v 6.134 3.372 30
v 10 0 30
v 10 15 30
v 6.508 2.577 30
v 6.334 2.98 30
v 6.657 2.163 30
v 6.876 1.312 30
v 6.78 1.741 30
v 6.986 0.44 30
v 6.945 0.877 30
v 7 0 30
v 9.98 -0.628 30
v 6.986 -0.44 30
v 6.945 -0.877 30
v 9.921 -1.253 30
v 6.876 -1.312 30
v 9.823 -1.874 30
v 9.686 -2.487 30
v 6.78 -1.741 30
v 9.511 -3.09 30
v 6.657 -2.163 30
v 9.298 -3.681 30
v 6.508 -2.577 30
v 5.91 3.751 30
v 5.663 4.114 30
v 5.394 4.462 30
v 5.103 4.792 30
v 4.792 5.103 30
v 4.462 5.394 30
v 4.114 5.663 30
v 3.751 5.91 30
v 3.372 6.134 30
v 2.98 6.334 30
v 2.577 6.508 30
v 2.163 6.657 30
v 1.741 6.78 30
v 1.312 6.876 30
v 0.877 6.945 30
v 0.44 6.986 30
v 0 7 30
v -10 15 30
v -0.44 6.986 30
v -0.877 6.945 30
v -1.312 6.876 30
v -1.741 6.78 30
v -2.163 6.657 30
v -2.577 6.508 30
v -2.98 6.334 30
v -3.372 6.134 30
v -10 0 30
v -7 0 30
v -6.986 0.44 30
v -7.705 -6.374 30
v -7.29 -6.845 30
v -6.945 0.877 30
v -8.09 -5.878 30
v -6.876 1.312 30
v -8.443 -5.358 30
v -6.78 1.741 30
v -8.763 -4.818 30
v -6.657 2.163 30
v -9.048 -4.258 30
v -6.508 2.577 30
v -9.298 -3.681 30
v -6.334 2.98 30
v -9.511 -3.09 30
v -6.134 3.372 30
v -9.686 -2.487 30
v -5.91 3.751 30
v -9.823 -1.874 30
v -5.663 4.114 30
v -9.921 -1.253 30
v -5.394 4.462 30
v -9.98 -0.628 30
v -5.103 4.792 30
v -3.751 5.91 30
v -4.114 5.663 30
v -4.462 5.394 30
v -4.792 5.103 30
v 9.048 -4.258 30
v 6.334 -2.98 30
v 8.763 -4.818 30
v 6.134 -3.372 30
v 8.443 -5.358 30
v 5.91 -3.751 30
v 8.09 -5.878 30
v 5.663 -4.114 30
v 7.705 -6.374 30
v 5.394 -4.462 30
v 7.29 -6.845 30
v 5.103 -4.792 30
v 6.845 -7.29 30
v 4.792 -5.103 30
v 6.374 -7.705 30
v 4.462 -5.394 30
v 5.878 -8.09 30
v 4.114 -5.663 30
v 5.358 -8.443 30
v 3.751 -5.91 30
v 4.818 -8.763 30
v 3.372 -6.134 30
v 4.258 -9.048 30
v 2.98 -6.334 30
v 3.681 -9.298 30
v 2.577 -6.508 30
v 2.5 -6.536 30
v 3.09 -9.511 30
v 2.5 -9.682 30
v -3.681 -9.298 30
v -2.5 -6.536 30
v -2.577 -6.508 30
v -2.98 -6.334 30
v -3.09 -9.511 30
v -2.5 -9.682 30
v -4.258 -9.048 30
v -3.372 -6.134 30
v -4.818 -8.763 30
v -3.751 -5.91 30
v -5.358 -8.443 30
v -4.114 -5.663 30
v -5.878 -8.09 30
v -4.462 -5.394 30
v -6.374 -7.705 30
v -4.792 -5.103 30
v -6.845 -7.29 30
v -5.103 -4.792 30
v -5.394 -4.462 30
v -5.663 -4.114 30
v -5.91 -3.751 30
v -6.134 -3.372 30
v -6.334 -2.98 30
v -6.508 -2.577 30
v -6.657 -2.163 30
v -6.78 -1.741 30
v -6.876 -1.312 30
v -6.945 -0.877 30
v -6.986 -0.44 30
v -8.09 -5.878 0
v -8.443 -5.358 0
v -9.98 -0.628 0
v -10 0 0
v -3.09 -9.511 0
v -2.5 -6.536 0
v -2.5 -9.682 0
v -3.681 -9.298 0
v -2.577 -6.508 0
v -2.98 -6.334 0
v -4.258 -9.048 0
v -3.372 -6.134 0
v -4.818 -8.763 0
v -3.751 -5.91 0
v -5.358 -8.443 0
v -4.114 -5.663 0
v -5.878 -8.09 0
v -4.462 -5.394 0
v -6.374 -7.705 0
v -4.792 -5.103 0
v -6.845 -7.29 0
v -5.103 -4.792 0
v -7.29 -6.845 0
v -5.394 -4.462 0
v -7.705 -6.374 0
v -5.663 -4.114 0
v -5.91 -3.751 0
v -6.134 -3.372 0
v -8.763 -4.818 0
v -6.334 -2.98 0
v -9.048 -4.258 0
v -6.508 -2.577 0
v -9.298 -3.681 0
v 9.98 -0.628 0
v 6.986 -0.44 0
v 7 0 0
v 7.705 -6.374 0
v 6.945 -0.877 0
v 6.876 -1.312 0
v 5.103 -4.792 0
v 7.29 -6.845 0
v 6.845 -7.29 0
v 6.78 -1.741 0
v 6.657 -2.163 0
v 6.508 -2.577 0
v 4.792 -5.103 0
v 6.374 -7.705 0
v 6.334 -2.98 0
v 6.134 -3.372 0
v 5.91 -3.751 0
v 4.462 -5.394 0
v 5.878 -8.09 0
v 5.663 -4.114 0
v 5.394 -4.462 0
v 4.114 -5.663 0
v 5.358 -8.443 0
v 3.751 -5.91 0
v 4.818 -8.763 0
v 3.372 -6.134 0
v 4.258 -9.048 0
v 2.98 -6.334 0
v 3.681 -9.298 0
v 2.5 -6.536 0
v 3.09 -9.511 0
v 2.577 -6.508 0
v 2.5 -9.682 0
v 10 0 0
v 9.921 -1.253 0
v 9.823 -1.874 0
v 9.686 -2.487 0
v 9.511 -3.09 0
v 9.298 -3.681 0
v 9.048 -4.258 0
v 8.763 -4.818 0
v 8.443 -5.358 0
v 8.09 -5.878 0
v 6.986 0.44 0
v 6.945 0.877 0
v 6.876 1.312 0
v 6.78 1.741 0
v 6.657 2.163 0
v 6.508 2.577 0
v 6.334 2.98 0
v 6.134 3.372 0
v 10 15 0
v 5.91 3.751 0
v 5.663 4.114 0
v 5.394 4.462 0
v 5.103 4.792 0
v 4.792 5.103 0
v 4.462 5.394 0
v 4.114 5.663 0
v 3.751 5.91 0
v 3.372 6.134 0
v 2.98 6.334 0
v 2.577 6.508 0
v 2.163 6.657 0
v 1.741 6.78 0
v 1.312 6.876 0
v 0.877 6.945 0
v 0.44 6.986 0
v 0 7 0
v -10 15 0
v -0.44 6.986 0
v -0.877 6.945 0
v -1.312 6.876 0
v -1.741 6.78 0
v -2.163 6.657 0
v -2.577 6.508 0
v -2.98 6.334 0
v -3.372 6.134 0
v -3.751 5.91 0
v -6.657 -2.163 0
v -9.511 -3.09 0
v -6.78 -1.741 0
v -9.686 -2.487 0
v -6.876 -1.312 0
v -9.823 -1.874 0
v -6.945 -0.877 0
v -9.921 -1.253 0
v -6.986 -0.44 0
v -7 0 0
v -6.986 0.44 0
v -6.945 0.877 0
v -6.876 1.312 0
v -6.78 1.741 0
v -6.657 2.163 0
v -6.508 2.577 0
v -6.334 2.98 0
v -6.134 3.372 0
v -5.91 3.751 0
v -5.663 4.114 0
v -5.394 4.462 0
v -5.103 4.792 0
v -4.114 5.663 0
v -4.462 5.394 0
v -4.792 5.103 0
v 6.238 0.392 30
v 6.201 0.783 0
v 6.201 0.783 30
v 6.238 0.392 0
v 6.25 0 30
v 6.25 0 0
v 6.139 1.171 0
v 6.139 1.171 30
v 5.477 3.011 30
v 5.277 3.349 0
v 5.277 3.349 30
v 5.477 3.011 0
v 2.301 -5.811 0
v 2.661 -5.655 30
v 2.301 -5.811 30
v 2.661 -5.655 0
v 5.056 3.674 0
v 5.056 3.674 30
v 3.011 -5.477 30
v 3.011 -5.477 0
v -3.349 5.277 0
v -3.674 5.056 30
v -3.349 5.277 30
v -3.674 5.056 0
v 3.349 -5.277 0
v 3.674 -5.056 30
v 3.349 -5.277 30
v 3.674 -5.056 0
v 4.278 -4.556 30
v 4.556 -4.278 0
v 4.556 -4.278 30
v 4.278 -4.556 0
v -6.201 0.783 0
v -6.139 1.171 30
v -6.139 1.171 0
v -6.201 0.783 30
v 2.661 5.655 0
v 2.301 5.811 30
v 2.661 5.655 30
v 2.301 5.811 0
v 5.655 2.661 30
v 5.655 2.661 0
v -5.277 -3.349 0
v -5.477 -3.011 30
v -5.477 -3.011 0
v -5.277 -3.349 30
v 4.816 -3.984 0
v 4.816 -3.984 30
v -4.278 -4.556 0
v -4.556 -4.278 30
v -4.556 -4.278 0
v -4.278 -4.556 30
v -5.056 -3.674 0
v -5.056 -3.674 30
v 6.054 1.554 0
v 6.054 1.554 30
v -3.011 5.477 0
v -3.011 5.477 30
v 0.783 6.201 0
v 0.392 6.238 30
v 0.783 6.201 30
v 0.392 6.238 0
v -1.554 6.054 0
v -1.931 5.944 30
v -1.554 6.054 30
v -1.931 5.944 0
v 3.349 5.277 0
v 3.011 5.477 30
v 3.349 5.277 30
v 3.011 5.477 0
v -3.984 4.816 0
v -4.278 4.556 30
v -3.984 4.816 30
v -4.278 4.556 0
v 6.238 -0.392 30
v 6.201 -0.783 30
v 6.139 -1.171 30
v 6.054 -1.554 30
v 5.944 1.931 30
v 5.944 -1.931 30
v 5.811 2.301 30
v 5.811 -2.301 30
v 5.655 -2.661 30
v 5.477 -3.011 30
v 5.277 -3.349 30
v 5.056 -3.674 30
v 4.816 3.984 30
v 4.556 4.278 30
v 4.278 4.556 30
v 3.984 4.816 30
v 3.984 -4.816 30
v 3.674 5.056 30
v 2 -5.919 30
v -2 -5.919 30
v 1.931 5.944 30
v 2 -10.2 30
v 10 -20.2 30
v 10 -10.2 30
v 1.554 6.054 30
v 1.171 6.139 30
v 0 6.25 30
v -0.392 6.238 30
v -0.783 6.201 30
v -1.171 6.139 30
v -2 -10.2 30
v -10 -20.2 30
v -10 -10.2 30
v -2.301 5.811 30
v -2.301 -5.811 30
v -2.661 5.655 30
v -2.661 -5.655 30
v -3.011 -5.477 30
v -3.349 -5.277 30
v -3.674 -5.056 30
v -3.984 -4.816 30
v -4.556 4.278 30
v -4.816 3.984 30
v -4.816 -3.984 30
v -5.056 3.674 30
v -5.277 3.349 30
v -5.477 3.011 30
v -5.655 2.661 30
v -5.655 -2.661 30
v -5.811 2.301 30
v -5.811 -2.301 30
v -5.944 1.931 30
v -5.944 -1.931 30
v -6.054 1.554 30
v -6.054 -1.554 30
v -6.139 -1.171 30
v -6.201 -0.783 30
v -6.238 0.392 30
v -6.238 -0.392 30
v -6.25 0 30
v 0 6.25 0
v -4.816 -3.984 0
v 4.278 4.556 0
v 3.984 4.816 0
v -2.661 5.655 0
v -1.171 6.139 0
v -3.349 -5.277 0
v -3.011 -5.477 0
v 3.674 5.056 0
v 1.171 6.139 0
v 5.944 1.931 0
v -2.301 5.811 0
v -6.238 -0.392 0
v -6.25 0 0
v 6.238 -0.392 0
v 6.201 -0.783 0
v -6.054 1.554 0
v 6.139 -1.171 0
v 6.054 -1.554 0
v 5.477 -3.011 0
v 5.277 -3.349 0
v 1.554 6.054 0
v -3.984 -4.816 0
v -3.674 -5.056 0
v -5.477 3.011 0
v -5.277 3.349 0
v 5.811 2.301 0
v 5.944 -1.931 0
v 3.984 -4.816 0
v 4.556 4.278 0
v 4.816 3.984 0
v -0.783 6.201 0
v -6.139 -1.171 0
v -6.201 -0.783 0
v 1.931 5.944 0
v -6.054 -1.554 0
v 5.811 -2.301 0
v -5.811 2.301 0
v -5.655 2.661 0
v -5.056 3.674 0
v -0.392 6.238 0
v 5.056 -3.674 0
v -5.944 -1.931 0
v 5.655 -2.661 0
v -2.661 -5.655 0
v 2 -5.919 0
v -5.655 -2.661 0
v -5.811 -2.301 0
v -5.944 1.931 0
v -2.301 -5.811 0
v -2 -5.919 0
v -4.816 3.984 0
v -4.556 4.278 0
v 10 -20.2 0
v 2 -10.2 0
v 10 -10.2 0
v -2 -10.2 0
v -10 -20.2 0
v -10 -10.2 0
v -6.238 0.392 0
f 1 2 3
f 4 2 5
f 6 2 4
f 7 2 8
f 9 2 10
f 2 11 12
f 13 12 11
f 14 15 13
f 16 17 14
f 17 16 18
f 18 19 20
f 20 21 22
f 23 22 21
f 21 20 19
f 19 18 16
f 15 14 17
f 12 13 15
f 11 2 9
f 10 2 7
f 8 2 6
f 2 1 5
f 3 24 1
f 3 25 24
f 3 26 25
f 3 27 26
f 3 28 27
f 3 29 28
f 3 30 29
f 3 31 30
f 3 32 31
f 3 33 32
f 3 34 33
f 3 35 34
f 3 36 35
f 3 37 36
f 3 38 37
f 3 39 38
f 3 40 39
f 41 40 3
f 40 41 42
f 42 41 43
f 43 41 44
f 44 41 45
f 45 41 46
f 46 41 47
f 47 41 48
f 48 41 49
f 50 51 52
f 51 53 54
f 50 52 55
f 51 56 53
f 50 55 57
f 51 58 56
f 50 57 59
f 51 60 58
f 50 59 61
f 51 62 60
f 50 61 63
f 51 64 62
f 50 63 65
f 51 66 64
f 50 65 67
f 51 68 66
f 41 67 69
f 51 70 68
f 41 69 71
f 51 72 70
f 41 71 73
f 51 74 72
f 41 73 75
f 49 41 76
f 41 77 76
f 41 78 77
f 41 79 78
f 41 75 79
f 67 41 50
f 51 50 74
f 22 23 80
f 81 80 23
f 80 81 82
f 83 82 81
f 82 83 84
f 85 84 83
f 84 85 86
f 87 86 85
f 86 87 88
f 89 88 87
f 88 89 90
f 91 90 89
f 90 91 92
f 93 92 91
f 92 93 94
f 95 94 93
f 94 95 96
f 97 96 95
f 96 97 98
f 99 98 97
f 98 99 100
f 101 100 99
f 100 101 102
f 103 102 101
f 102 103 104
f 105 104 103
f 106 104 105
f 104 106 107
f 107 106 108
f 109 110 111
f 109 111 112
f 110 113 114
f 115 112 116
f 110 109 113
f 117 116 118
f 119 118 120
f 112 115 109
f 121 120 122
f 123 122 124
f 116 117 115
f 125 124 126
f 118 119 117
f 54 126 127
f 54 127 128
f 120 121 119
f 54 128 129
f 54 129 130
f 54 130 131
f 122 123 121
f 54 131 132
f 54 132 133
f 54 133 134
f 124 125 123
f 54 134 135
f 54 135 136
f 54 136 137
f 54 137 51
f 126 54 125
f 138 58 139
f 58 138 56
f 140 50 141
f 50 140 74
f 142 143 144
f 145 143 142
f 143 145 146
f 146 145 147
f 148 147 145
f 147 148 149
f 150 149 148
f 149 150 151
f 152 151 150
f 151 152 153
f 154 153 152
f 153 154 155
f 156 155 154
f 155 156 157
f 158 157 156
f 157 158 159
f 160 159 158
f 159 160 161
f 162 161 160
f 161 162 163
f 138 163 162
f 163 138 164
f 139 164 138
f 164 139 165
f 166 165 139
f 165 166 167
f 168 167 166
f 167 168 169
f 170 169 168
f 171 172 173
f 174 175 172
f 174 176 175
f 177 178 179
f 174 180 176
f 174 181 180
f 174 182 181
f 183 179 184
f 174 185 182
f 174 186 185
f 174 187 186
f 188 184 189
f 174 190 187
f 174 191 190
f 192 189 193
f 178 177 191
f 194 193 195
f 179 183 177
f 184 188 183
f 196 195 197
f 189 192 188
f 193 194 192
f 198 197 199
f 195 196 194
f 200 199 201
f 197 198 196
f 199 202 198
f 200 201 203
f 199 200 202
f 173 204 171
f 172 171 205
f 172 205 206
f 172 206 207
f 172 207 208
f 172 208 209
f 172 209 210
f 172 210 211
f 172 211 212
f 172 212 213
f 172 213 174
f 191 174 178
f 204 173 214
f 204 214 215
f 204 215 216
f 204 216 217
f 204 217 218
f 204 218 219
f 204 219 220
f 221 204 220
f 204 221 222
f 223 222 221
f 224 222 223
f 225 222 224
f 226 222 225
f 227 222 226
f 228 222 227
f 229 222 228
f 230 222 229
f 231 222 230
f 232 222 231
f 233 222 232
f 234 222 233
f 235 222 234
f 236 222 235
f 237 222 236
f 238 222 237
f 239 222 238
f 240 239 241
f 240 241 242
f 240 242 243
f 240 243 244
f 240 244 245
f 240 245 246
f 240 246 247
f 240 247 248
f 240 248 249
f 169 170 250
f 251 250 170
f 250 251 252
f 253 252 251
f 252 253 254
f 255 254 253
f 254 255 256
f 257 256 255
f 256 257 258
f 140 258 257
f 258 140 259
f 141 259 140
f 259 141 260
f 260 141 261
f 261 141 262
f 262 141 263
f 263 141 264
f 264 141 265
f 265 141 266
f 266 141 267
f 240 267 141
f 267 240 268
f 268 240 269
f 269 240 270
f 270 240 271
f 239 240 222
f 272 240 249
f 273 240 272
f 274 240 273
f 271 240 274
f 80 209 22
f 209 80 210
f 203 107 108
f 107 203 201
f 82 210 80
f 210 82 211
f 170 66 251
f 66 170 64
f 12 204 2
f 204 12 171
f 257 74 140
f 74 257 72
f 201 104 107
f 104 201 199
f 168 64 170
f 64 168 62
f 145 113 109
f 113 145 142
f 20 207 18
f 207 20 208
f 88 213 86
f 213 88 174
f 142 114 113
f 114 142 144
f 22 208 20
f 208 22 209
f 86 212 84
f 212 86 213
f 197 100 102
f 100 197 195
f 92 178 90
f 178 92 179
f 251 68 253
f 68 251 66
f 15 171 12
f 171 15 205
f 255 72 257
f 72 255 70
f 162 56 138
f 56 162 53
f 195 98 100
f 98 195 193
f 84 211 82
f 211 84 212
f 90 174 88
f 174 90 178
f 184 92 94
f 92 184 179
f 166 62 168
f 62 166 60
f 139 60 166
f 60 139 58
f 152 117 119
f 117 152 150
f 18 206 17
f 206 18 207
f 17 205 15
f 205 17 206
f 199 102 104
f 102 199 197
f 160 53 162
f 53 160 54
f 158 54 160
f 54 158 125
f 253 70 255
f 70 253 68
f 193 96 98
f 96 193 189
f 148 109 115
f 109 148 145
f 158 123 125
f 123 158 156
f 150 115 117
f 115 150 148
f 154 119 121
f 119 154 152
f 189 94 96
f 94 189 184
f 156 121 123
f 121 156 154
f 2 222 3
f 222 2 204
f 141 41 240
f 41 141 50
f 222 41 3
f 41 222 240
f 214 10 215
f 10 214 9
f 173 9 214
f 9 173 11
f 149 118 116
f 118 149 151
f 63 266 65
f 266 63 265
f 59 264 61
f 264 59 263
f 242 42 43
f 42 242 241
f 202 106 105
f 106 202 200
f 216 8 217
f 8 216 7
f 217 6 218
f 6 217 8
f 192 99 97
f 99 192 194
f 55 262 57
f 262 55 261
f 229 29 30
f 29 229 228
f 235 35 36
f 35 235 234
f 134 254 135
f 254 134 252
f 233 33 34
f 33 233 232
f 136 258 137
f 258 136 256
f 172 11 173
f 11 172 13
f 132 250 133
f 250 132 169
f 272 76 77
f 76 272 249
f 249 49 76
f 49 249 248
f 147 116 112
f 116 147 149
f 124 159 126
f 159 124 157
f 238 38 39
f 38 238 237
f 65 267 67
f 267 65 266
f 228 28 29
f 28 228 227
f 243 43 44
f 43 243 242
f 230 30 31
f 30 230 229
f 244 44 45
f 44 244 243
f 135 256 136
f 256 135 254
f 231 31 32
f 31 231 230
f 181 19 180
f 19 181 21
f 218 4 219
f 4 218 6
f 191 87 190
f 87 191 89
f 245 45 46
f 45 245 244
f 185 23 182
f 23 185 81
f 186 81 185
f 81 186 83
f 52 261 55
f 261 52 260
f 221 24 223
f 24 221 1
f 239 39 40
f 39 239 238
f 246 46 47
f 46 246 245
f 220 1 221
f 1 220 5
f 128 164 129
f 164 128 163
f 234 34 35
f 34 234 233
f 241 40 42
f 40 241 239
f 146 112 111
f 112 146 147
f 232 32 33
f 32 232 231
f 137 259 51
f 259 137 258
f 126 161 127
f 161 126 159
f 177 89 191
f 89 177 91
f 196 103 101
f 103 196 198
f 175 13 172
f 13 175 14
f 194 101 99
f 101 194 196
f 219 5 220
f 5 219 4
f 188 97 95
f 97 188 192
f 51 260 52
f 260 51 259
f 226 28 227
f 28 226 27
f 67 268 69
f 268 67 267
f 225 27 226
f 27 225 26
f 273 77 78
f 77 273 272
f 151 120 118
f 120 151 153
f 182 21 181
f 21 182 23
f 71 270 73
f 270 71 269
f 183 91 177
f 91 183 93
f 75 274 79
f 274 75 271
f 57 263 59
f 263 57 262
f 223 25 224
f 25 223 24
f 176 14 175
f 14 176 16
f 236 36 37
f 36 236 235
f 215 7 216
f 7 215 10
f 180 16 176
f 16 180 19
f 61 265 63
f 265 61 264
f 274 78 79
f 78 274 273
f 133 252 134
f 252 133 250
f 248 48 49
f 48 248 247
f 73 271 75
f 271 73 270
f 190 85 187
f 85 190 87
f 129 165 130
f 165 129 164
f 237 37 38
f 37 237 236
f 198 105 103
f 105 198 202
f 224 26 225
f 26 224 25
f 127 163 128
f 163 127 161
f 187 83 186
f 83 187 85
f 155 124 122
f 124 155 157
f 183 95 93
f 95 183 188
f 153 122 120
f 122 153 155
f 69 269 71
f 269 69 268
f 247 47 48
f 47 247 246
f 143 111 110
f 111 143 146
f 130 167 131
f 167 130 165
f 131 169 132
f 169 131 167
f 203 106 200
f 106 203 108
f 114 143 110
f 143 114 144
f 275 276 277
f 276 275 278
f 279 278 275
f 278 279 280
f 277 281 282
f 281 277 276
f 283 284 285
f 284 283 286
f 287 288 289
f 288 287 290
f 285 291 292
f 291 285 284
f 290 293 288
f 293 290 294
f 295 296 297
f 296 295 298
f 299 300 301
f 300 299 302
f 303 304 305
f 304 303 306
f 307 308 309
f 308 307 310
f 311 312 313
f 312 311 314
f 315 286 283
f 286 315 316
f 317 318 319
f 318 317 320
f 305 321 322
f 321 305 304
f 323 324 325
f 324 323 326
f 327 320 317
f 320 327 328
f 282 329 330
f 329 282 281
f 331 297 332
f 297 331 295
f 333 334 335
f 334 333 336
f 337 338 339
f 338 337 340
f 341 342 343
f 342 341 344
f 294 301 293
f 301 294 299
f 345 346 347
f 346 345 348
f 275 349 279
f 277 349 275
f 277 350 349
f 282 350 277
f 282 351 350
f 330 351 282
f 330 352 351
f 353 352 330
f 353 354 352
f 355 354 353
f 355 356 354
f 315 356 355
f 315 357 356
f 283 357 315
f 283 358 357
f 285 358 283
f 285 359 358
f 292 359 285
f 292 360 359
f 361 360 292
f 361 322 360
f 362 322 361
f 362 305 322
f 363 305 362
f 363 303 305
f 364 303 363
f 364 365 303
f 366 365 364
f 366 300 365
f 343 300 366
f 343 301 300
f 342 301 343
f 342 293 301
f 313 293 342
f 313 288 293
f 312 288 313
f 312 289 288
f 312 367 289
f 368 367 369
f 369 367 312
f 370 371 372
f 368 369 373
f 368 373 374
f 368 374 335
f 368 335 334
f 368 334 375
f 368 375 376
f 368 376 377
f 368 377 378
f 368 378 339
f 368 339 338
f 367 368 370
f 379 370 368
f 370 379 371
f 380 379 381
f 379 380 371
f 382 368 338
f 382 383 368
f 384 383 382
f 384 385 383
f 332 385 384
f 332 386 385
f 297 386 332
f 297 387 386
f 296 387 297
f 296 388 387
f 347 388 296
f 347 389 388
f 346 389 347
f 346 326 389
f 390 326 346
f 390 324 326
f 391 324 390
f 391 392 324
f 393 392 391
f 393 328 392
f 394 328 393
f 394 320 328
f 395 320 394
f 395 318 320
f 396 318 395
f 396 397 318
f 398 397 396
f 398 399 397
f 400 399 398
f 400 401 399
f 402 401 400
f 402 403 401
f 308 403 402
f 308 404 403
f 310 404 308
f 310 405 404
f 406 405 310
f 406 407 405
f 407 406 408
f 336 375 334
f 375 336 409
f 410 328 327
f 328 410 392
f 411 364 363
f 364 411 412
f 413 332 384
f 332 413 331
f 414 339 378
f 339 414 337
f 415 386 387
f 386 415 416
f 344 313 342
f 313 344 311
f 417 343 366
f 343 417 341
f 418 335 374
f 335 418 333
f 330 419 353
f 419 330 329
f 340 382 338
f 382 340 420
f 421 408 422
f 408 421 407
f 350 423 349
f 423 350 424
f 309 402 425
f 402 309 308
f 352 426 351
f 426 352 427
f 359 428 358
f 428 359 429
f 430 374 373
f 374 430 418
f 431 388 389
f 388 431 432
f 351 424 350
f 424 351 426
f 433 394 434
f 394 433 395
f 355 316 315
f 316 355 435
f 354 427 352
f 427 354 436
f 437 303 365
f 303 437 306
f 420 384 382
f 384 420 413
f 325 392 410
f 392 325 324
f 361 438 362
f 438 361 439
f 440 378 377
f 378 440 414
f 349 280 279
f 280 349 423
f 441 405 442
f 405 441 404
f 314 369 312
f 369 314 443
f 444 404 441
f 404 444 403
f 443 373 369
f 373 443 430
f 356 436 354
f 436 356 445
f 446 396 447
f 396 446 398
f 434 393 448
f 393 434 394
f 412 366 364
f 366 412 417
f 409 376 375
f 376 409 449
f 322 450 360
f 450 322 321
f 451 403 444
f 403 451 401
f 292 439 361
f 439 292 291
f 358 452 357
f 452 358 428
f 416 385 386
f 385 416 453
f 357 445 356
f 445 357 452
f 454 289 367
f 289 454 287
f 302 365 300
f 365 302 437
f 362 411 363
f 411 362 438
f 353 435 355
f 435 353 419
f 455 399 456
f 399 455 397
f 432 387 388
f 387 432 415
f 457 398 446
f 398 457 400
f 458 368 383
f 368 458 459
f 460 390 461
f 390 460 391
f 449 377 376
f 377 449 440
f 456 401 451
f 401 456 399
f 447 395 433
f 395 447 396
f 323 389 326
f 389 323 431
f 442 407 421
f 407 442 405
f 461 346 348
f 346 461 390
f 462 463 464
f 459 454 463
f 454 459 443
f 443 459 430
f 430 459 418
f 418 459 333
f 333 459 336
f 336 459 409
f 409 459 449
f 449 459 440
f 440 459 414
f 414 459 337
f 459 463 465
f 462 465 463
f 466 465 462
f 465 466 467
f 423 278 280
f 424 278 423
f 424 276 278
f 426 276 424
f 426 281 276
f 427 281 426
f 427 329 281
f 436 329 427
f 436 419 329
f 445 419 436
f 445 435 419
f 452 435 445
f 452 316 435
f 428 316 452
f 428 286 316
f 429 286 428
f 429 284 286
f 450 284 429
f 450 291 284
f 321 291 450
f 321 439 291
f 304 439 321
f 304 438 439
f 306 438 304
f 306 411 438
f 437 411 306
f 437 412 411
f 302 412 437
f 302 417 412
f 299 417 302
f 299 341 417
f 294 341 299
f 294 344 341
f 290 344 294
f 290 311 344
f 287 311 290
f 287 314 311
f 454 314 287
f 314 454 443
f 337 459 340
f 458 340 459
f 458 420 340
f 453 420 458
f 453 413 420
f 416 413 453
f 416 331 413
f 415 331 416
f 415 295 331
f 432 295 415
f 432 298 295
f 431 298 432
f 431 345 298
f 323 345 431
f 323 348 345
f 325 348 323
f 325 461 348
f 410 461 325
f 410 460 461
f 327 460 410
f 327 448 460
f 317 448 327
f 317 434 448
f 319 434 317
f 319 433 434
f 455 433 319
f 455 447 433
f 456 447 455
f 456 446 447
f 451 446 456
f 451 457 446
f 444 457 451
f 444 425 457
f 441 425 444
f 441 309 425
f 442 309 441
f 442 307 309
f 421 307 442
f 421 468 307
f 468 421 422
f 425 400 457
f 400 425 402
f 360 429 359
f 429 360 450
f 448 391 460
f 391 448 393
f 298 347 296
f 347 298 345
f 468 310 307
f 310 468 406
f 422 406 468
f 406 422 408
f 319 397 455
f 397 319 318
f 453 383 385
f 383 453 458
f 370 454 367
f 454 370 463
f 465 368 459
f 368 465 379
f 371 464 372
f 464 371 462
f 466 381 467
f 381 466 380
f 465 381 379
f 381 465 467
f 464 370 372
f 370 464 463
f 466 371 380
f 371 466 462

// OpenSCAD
// file: myTools.scad
module tube (r = 0, d = 0, l = 0, 
            thick = 0, 
            bCentered = true, 
            taper_pct = 0, 
            circlip = false) // r=radius d=dia l=length 
{
    assert( r != 0 || d != 0, "specify one of radius or diameter");
    assert( l != 0 , "tube: need length 'l' to be non zero");
    assert( thick != 0, "wall thickness cannot be zero");

    punch = $preview ? .2 : 0; // stop funny view artifact

    dia = r ? r * 2 : d;

    od = ((thick > 0) ? dia + thick * 2 : dia);
    id = (thick > 0) ? dia             : dia  + thick *2; 

    
    
    if (thick > 0)
        echo ("tube\tMIN id = ", id, "od = ", od, "wall = ", thick, "center= ", bCentered);
    else
        echo ("tube\tMAX od = ", od, "id = ", id, "wall = ", thick, "center= ", bCentered);

    echo ("tube\tHeigth = ", l);
        
    if (taper_pct != 0)
    {
        echo ("tube\t*** OD expanded by ", taper_pct, "%, : bottom od = ", od * (1. +taper_pct/100), "top od = ", od);
    }
    
    assert(dia || dia < 0, "tube : missing r or d ");
    
    // if taper_pct specified, the base will always be closest to 0,0,0
    translate([ 0, 0, taper_pct == 0 ? 0: bCentered ? l/2:l  ])
    rotate([0, taper_pct == 0 ? 0 : 180, 0 ])

    difference()
    {
        // make a reese's cup
        {
            color("YELLOW", .3)
            linear_extrude(height= l, scale = 1 + taper_pct/100)
                difference()
                {
                    circle(d = od);
                    circle(d = .5);
                }
        }
    
     // hollow out reessed cup
     color("GREEN")
     translate([0, 0, -punch/2])
     linear_extrude(height= l+ punch*2, $fn=100)
     {
        circle(d = id);
        if (circlip) #square([1 + punch, od ]);
     }
    
    }
}
//==============================================================================
        
module abox (dims, 
            thick = 0, 
            bCentered = true, 
            round_out = 0, 
            round_in = 0, 
            bSolid = false,
            bHollow = false,
            elevator = 0)   // move bottom up by X
{
    punch = $preview ? .1 : 0; // stop funny view artifact
    
    assert(thick != 0, "Thick must be specified. +=outside dim, -= inside dims");
    assert(dims.z > thick, "wall thickness too large for depth of box");

    wall2 = abs(thick) * 2; // 2 walls in each direction
    wall = wall2 / 2;
    
    // box either grows inward (thick < 0) or outward (thick > 0)  from dims
    fat = dims + [ wall2, wall2, wall];
    thin = dims - [ wall2, wall2, wall];
    
    offset = (thick > 0 && bCentered == false) ? wall : 0;
    
    //echo ("abox : adjusting x,y,z by ", offset, " to move origin from  center to 0,0,0");
    translate( [ bCentered ? 0 : dims.x /2 + offset, bCentered ? 0 : dims.y /2 + offset, bCentered ? 0 : dims.z /2 + offset/2]) 
    {
        if (thick > 0)
        {   
            // wall grows outwards from users dim
            echo ("making a box, MAX INSIDE dim = ", dims);
            echo ("   wall=", thick, " mm");
            echo ("   calc outside = ", fat, " mm");
        }
        else
        {
            // wall grows inward from users dime
            echo ("making a box, MAX OUTSIDE dim = ", dims);
            echo ("    wall=", thick, "mm");
            echo ("    calc inside = ", thin, " mm");
        }
        echo (" ");
        
        // linear extrude alway works in the positive x/y plane an goes upward.
        // after calc, re-center about 0,0,0 where a bCentered cube would be
        
        translate([ 0, 0, thick > 0  ? -fat.z/2 : -dims.z/2 ])
        difference()
        {
            echo ("round_out = ", round_out);

            // MAKE SOLID BOX --------------------------------------
            router_outside = round_out ? round_out : 0;
            x = thick > 0  ? fat.x - router_outside : dims.x - router_outside;
            y = thick > 0  ? fat.y - router_outside : dims.y - router_outside;


            // MAKE PUCHNED INSIDE
            // using 'offset' it will add r on all dimensions, then round., 
            // so now you have fatter perimeter than you started with :(
            //  but at least the corners are round.
            
            // Compensate by shrinking dimension by r, 
            // and then by calling offset, offset will then add it back

            //color("YELLOW", .2)

            // ready height 
            linear_extrude(thick > 0  ? fat.z : dims.z)
            if (round_out)
            {
                offset( r= round_out, $fn=30)
                square( [x - router_outside, y - router_outside], true);
            }
            else
            {
                // no rounding on outside dims.
                square( [x, y], true);
            }
            // time to punch out the inside if requested.
            if (bSolid == false)
            {
                hollow_offset = bHollow ? fat.z/2 + .2  : dims.z/2 +.2;
                // punching out inside. its either dims or thin.
                router_inside = round_in;
                echo ("round_in = ", router_inside);
                xi = thick > 0  ? dims.x  : thin.x;
                yi = thick > 0  ? dims.y : thin.y ;

                color("GREEN")

                // move 'punch' up if you need a bottom else zero (hollowed out)

                translate([ 0,0, bHollow ? -.1 : wall + elevator]) 
                linear_extrude(thick > 0  ? fat.z - wall  + hollow_offset : dims.z - wall + hollow_offset)
                //#linear_extrude(fat.z - wall  + hollow_offset)
                
                if (round_in) 
                {
                    offset( r= round_in, $fn=30)
                    square( [ xi - round_in*2, yi - round_in*2], true);
                }
                else
                    square( [ xi, yi], true);
            }
        }
    }
 }
//-----------------------------------------------------
module abox_punch (dims, 
            thick = 0, 
            bCentered = true, 
            round_out = 0, 
            round_in = 0, 
            bSolid = false,
            bHollow = false,
            elevator = 0)   // move bottom up by X
{
    // move bottom down by wall thickness to blow out bottom
    abox(dims, thick, bCentered,
         round_out, round_in, bSolid = false, 
         bHollow=true, elevator = -thick);
}



// 50x25x10 box walls grow inward (-2). on center origin midpoint
// rounded outside (default), sharp corner inside(default), bCentered about 0,0,0
//color("GREEN", .9)
//abox([50,25, 10], -2, true); 


// 50x25x10 box walls grow outward (+2). on center origin midpoint
// sharp outside corners, rounded inside corners. Sit on x,y plane
color("BLUE", .9)
abox([50,20, 10], +2, round_in=2, bCentered = false);  // 50x25x10 box inside dim origin has 0,0


// 50x25x10 box walls grow inward (-2). on center origin midpoint
// sharp corners inside and out. sits on x,y plane
color("GREY", .9)//
translate([ 55, 0, 0])      
abox([50,20, 10], +2, round_out=3, false);

color("PINK", .9)//
translate([ 55 * 2, 0, 0])      
abox_punch([50,20, 10], +2, round_out=3, false);

color("GREEN", .9)//
translate([ 55 * 3, 0, 0])      
abox_punch([50,20, 10], +2, round_in=2, false);


color("CYAN", .9)//
translate([ 55 * 4, 0, 0])      
abox_punch([50,20, 10], +2, round_in=2, round_out=2, false);


/*
color("GREEN", .9)//
translate([ 140, 10, -10])      
abox([86.66, 56.865, 5], 3, bHollow = true, bCentered = false); 
*/

/*
// 50x25x10 box walls grow inward (-2). on center origin midpoint
// round corners outside and SOLID
color("BLUE", .9)//
translate([ 55, 0, 0])      
abox([50,25, 10], +2, round_out=2, round_in=0, false, bSolid = true); // 50x25x10 box outside dim origin is 0,0
*/

//translate ([-30,-30, 0])
{
/*
    // tube outer dia  20, inner dia = (20 - 8)
    color("PINK")
    tube (d = 20, l = 20, thick = -8, bCentered = false);

    // tube, inner dia = (2* 10), outer dia = ((2*10) + 2) 
    color("PURPLE", .3)
    tube (r = 10, l = 20, thick = +2, bCentered= true);
*/
/*
    tube (d = 60, l = 20, thick = -6, bCentered = false);

    translate([0, 0, 50])
    tube (d = 60, l = 20, thick = -6, bCentered = false, taper_pct = 20, circlip = true);
    //color("GREEN")
    //tube (d = 20, l = 20, thick = -2, bCentered = false, taper = 10, circlip = true);
*/

}
// main file
use <myTools.scad>
$fn=100;

THICK=3;
DIA=20;
HEIGHT= 30;

DEMO=1;

UP= DEMO ? 0 : 5;


module top()
{
    difference()
    {
        union()
        {
            cylinder (d=DIA, h = HEIGHT);
            translate([-DIA/2, 0, 0])
            cube([DIA, DIA * 3/4, HEIGHT]);
        }
        
        translate([ 0, 0, UP -.1 ])
        cylinder (d=DIA-THICK*2, h= HEIGHT+.2);

        translate([ -DIA/8, -DIA, UP -.1 ])
        cube([DIA/4, DIA, HEIGHT+.1]);
        
    }
}   

module bottom()
{
    //difference()
    {
        //union()
        //{
        //    cylinder (d=DIA, h = HEIGHT);
        //    translate([-DIA/2, 0, 0])
        //    cube([DIA, DIA, HEIGHT]);
        // }
        
        translate([ 0, 0, UP ])
        cylinder (d=DIA-THICK*2 - 1.5, h= HEIGHT -UP );

        translate([ -DIA/8 + .5, -DIA, UP  ])
        cube([DIA/4-1, DIA, HEIGHT -UP ]);

        translate([-DIA/2, -DIA - .2, UP ])
        cube([DIA, DIA * 2/4, HEIGHT -UP]);
        
    }
}   


top();

//place bottom back on floor
translate([ DEMO ? 0 : 25, 0, DEMO ? 0 : -UP ]) 
bottom();
